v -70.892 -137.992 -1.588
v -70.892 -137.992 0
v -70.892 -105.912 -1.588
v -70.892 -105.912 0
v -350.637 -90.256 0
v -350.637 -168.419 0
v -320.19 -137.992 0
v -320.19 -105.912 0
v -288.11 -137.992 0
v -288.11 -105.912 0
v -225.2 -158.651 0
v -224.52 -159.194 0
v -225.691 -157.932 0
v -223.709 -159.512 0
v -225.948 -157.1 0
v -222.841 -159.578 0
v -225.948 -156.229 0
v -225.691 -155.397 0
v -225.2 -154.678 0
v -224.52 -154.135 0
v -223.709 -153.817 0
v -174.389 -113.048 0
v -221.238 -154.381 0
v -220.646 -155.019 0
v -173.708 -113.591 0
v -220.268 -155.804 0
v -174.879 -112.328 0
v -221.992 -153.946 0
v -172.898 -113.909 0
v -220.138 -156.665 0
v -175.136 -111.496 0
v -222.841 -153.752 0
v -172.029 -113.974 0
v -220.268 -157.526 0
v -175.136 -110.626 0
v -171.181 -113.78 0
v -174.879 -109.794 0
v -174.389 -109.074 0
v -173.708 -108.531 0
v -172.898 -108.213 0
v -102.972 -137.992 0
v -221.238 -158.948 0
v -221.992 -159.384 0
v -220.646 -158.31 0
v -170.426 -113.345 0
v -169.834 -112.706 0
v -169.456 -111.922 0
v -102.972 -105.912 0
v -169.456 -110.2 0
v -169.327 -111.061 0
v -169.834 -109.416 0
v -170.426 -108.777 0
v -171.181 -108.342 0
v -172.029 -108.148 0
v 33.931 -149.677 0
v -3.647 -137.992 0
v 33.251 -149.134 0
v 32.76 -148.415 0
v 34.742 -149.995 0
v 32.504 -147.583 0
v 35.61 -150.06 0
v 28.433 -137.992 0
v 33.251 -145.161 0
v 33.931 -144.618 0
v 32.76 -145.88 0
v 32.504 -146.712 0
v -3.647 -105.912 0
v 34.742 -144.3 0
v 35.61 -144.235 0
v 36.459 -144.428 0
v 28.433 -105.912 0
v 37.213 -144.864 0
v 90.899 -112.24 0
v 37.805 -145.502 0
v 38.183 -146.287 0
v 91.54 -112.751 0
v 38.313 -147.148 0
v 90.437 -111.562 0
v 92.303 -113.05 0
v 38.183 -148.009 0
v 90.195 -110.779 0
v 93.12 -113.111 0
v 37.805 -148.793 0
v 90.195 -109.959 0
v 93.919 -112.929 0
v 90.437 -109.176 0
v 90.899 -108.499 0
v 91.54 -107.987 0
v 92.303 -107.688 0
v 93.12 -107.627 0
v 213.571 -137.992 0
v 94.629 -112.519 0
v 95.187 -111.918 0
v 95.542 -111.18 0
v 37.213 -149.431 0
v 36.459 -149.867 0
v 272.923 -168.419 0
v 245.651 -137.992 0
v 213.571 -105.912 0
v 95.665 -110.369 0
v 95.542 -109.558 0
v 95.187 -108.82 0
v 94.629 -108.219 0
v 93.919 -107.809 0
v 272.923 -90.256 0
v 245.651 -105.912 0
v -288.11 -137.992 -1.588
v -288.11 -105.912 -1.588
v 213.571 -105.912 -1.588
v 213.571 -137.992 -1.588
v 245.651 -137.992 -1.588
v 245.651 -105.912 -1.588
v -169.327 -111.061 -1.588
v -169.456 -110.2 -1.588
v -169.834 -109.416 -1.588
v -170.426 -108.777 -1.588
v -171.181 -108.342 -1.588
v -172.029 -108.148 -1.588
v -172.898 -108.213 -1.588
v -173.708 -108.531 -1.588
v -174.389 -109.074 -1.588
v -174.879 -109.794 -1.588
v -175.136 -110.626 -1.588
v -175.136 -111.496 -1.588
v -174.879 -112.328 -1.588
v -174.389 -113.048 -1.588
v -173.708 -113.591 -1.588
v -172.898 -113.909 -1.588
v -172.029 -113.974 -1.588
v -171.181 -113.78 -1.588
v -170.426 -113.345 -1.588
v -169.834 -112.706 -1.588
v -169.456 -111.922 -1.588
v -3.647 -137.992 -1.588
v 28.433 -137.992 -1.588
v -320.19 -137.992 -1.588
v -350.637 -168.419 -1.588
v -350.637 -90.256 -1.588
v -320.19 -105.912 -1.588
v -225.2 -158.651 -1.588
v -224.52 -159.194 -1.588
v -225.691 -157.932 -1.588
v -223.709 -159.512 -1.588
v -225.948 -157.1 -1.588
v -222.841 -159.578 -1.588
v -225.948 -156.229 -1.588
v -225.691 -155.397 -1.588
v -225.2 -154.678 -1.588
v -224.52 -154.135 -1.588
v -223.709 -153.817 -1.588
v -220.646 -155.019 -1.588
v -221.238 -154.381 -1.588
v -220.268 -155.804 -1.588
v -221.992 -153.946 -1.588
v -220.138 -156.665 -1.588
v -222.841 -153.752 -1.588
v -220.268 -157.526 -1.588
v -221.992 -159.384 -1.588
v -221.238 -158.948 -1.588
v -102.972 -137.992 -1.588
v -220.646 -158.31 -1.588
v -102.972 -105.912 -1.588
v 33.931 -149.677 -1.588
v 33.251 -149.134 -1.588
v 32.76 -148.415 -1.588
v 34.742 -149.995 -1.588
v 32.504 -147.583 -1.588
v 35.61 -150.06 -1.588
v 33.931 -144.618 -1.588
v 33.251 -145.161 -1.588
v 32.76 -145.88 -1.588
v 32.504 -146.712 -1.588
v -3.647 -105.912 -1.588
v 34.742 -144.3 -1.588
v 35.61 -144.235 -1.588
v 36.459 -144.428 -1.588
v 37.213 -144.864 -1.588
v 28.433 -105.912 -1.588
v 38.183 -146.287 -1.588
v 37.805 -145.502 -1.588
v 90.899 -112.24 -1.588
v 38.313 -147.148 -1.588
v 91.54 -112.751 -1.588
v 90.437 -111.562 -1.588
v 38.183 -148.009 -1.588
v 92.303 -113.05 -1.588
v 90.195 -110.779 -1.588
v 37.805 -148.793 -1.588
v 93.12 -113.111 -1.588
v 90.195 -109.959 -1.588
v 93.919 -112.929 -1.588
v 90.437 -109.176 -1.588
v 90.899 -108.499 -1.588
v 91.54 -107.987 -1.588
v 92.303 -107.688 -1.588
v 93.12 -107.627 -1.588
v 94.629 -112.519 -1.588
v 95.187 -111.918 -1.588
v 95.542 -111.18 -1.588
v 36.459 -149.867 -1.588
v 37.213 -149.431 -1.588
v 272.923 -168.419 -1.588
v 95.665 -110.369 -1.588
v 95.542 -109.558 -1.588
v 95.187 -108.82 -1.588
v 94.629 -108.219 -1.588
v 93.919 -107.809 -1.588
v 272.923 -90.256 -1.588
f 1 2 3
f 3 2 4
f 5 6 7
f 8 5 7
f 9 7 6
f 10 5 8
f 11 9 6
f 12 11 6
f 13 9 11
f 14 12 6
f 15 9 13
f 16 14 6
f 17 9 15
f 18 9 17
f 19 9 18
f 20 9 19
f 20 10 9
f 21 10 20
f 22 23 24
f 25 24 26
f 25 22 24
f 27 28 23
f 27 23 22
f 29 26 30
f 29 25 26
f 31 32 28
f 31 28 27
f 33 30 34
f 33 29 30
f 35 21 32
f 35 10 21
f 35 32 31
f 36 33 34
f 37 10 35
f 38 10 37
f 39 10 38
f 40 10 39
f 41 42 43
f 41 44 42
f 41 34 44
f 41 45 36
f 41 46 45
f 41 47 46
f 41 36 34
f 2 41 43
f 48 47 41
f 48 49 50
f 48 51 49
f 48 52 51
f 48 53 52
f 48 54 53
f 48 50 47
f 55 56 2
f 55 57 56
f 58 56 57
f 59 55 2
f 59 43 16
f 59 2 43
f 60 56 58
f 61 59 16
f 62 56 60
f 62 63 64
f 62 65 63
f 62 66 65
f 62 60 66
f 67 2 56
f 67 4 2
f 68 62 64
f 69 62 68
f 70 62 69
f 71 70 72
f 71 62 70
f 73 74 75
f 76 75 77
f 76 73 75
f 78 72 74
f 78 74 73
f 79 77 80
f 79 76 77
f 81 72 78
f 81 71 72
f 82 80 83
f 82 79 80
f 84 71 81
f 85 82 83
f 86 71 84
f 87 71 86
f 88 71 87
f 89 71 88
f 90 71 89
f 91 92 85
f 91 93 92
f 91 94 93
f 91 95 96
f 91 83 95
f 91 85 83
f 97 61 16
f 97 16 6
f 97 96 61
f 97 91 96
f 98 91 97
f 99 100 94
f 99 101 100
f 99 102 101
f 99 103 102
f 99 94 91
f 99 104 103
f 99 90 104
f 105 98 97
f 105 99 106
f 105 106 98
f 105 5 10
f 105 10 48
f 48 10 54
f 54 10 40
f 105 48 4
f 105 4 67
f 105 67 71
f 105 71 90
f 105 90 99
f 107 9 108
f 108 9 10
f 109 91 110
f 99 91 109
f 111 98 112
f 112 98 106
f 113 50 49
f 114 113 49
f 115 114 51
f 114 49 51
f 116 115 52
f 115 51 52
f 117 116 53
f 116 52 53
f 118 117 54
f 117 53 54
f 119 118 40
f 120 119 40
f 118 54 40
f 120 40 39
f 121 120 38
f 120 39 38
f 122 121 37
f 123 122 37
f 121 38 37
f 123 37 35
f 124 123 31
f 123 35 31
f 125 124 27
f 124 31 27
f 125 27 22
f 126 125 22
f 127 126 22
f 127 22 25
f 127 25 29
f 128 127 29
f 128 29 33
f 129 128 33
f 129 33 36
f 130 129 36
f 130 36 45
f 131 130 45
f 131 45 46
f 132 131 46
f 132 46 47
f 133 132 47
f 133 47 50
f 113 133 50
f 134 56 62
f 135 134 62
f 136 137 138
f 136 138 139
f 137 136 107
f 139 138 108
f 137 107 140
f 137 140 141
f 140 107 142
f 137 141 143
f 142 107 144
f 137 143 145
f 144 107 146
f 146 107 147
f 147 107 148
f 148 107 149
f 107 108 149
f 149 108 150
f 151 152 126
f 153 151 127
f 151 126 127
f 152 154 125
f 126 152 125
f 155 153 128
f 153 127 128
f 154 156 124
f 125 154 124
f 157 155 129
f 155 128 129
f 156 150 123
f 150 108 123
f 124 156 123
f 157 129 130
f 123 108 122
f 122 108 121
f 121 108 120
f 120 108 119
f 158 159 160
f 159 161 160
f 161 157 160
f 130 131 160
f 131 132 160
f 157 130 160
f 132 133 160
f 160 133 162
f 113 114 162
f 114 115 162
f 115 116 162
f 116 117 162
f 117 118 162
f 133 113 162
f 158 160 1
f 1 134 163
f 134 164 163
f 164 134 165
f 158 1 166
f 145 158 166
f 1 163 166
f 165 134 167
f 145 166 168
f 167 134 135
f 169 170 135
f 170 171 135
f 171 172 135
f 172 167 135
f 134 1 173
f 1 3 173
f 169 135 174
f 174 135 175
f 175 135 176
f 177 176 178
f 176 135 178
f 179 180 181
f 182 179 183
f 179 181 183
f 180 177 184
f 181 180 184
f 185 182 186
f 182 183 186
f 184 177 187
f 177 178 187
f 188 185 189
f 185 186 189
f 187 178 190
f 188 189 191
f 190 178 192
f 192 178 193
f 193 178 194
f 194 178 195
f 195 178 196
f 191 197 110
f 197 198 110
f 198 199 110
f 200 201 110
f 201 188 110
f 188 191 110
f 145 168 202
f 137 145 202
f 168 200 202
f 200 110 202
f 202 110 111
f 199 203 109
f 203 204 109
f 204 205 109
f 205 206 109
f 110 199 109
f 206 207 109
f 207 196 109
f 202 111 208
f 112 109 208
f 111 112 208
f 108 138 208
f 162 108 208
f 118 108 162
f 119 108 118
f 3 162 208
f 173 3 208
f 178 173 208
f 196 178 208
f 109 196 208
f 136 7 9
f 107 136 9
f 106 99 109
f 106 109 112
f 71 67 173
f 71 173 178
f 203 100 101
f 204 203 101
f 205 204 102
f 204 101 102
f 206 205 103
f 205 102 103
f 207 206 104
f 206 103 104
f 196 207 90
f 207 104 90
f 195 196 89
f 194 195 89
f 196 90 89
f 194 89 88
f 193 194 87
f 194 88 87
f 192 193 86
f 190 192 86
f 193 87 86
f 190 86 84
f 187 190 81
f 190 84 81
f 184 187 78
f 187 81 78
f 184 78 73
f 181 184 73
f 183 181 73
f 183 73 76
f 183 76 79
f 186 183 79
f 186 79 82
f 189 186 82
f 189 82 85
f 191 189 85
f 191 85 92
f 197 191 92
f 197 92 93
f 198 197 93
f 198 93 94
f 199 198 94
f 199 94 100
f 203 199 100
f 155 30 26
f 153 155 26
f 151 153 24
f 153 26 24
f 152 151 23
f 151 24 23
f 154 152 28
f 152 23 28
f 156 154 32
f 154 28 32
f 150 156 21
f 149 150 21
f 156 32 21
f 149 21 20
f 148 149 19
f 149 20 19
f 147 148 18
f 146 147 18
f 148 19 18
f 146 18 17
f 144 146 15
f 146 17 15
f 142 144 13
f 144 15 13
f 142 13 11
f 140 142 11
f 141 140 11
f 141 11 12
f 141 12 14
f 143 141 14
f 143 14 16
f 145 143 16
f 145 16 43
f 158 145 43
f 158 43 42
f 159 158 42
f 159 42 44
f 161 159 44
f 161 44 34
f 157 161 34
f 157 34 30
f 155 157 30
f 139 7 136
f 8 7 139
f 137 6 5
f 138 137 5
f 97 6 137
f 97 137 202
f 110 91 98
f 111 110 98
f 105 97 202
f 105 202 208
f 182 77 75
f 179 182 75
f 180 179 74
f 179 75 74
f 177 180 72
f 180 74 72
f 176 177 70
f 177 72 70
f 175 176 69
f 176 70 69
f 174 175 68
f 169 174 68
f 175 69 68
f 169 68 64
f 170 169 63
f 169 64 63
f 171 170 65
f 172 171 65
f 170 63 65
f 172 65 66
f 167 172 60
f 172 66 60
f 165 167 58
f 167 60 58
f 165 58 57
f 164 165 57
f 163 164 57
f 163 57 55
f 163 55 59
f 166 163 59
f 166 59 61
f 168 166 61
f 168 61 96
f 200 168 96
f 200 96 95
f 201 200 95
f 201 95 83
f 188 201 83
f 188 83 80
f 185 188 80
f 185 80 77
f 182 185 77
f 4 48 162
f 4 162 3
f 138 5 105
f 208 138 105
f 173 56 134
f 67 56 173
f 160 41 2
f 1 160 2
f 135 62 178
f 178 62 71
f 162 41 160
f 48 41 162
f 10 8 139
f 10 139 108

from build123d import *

# Parameters (mm, degrees)
SKETCH1_W          = 623.55984
SKETCH1_H          = 78.16342
BASE_FLANGE1_DEPTH = 1.5875
SKETCH3_R          = 2.75
SKETCH3_R_2        = 2.921
SKETCH3_W          = 32.08
SKETCH3_H          = 32.08
CUT_EXTRUDE3_DEPTH = 389.990867909


# Sheet-metal steps are written as plain solids
with BuildPart() as part:
    # Sketch1 → Base-Flange1 (new body)
    with BuildSketch(Plane.XY):
        with Locations((-38.857061865, -129.337653818)):
            Rectangle(SKETCH1_W, SKETCH1_H)
    extrude(amount=-BASE_FLANGE1_DEPTH)

    # Sketch3 → Cut-Extrude3 (cut, through all)
    with BuildSketch(Plane.XY):
        with Locations((92.914515529, -110.369060902)):
            Circle(SKETCH3_R)
        with Locations((35.391947046, -147.147547142)):
            Circle(SKETCH3_R_2)
        with Locations((-172.247688202, -111.060995593)):
            Circle(SKETCH3_R_2)
        with Locations((-223.059163384, -156.664689794)):
            Circle(SKETCH3_R_2)
        with Locations((-304.149901865, -121.952427932)):
            Rectangle(SKETCH3_W, SKETCH3_H)
        with Locations((-86.931641865, -121.952427932)):
            Rectangle(SKETCH3_W, SKETCH3_H)
        with Locations((12.392518135, -121.952427932)):
            Rectangle(SKETCH3_W, SKETCH3_H)
        with Locations((229.610778135, -121.952427932)):
            Rectangle(SKETCH3_W, SKETCH3_H)
    extrude(amount=-CUT_EXTRUDE3_DEPTH, mode=Mode.SUBTRACT)


solid = part.part
